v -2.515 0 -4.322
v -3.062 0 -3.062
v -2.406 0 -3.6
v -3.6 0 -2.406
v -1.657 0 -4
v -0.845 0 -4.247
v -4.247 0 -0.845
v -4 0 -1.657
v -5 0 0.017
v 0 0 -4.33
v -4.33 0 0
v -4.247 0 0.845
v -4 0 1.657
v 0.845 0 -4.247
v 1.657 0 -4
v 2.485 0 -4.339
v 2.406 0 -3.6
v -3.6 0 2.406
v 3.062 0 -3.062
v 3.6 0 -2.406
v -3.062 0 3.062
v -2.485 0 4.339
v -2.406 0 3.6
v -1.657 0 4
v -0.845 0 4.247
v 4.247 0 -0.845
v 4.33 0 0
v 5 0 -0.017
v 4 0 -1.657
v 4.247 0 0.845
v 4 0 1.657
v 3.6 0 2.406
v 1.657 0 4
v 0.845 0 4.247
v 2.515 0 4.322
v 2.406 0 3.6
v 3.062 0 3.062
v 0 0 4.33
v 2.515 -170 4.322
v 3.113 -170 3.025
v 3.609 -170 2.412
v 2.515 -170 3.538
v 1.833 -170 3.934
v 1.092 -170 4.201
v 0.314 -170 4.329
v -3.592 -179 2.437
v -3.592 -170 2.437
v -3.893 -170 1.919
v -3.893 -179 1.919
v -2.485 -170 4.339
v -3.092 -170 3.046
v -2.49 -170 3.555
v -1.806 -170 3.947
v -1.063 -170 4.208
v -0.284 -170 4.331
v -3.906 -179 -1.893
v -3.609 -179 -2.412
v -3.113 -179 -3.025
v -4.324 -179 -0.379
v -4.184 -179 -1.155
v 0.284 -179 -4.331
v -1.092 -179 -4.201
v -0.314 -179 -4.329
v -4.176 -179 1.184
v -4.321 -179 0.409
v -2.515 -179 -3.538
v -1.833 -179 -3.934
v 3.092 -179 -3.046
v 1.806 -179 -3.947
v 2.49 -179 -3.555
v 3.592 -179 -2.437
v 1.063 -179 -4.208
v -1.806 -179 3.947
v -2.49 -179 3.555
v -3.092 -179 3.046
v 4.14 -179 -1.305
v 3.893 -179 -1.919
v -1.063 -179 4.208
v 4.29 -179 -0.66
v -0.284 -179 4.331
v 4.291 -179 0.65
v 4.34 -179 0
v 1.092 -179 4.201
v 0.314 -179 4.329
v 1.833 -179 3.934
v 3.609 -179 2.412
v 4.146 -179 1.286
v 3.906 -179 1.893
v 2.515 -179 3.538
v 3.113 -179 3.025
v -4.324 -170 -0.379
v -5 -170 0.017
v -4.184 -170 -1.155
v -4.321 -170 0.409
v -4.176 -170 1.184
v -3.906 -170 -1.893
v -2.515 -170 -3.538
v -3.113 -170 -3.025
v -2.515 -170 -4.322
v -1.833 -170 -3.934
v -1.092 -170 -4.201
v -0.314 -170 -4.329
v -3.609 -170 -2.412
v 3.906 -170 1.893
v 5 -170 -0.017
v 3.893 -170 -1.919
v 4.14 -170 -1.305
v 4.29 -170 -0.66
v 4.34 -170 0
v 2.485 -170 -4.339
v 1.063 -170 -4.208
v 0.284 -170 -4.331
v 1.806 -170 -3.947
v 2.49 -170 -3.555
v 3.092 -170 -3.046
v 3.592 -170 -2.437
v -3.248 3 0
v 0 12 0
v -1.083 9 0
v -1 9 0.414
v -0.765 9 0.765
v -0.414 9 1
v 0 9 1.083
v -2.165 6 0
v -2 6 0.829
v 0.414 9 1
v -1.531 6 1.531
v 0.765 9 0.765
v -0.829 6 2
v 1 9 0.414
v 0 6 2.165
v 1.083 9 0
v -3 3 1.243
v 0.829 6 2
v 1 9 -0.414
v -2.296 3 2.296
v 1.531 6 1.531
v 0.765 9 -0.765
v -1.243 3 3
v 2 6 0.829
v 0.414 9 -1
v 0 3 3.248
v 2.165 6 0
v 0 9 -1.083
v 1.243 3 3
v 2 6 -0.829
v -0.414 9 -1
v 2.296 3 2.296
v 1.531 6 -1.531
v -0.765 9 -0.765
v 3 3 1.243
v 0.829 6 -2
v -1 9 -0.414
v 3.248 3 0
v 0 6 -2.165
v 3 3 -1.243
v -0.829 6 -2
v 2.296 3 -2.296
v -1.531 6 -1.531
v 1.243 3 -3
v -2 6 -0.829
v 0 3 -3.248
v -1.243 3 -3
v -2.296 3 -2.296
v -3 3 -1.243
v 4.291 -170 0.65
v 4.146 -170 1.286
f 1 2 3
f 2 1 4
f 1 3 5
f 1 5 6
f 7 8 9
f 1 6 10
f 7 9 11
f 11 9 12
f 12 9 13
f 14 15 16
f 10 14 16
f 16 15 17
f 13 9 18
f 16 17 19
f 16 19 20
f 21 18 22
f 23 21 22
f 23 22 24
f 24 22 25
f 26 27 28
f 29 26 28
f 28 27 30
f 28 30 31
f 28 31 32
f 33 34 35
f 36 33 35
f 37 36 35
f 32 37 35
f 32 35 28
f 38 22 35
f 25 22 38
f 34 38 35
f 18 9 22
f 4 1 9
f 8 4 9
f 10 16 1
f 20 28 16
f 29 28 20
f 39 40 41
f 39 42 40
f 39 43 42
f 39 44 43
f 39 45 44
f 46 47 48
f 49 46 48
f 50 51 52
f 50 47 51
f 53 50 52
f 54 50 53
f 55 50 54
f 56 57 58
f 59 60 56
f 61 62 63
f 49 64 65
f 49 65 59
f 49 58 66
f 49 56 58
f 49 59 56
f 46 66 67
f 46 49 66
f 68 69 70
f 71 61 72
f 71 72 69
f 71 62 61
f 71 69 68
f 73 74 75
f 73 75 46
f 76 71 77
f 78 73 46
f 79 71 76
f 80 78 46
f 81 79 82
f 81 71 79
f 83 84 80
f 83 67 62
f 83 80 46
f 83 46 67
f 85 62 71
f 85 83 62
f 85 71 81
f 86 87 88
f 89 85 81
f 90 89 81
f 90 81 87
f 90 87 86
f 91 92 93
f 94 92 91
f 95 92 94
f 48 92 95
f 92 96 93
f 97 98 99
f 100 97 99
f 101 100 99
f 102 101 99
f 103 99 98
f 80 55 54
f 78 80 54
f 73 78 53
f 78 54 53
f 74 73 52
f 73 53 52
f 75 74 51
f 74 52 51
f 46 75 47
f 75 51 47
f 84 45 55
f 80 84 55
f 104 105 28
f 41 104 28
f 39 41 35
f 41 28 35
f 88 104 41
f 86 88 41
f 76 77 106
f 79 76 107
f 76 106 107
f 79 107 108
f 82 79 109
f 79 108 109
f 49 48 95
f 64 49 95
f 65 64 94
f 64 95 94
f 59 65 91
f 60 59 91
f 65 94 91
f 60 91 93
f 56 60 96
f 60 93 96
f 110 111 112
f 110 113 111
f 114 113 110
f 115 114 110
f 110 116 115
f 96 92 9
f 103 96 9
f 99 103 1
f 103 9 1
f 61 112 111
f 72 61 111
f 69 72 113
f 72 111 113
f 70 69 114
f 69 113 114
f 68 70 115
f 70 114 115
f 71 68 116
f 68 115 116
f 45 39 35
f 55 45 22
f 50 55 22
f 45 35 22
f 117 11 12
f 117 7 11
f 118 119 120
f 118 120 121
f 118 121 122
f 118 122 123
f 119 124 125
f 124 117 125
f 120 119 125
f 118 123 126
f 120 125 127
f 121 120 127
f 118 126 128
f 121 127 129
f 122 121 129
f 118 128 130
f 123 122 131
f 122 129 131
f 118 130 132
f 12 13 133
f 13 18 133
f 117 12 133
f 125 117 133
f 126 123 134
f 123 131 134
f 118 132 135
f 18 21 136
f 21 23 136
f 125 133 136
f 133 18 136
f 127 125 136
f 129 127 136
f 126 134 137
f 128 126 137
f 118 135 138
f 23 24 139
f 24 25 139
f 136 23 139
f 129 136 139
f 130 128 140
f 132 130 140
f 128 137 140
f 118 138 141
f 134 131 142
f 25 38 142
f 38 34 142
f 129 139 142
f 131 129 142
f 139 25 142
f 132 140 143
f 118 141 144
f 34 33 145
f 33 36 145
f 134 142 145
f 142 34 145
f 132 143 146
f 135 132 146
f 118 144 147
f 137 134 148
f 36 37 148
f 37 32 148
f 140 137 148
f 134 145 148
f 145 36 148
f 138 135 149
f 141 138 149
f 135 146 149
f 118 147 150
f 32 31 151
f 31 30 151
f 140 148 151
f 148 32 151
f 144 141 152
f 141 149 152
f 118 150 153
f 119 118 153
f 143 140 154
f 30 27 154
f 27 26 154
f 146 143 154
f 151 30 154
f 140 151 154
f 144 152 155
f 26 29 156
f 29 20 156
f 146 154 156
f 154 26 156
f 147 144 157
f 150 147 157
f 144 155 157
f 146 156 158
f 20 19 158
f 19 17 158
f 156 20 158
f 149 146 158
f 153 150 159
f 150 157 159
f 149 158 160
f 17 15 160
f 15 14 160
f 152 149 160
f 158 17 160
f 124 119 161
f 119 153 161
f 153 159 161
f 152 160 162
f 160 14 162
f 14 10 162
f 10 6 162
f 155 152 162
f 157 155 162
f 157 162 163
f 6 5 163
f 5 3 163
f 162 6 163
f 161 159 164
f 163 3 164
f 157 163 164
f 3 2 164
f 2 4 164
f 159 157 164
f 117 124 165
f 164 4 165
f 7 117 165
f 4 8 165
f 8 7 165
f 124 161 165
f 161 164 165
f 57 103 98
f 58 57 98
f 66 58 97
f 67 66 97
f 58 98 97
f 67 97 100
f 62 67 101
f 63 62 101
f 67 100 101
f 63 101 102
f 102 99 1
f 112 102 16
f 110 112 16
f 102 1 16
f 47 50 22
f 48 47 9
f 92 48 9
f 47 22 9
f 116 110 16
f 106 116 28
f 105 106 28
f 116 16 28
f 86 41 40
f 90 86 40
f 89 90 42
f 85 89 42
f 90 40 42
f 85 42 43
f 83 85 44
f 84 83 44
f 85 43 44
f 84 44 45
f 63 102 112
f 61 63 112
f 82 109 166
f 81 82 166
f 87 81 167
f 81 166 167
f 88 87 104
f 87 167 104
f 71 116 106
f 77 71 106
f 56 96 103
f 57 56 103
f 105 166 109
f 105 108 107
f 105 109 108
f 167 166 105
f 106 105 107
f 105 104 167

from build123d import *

# Parameters (mm, degrees)
F1_DEPTH = 170
F5_DEPTH = 9


with BuildPart() as f1:
    # F0 (on Front) → F1 (new body)
    with BuildSketch(Plane.XZ):
        Polygon((4.999971, -0.017115), (2.514808, 4.321544), (-2.485163, 4.338659), (-4.999971, 0.017115), (-2.514808, -4.321544), (2.485163, -4.338659), align=None)
    extrude(amount=F1_DEPTH)

    # F2 (on Top) → F3 (revolve)
    with BuildSketch(Plane.XY):
        Polygon((-4.33, 0), (0, 0), (0, 12), align=None)
    revolve(axis=Axis((0, 6, 0), (0, 1, 0)))

    # F4 (on face) → F5 (join)
    with BuildSketch(Plane.XZ.offset(170)):
        with BuildLine():
            ThreePointArc((3.893099, -1.919207), (4.227139, -0.985328), (4.340458, 0))
            ThreePointArc((4.340458, 0), (4.230487, 0.970853), (3.906147, 1.89251))
            Line((3.906147, 1.89251), (3.608632, 2.411919))
            ThreePointArc((3.608632, 2.411919), (2.183083, 3.751496), (0.314112, 4.329077))
            Line((0.314112, 4.329077), (-0.284467, 4.331126))
            ThreePointArc((-0.284467, 4.331126), (-2.157349, 3.766354), (-3.592035, 2.436567))
            Line((-3.592035, 2.436567), (-3.893099, 1.919207))
            ThreePointArc((-3.893099, 1.919207), (-4.340433, 0.014858), (-3.906147, -1.89251))
            Line((-3.906147, -1.89251), (-3.608632, -2.411919))
            ThreePointArc((-3.608632, -2.411919), (-2.183083, -3.751496), (-0.314112, -4.329077))
            Line((-0.314112, -4.329077), (0.284467, -4.331126))
            ThreePointArc((0.284467, -4.331126), (2.157349, -3.766354), (3.592035, -2.436567))
            Line((3.592035, -2.436567), (3.893099, -1.919207))
        make_face()
    extrude(amount=F5_DEPTH)


solid = f1.part
